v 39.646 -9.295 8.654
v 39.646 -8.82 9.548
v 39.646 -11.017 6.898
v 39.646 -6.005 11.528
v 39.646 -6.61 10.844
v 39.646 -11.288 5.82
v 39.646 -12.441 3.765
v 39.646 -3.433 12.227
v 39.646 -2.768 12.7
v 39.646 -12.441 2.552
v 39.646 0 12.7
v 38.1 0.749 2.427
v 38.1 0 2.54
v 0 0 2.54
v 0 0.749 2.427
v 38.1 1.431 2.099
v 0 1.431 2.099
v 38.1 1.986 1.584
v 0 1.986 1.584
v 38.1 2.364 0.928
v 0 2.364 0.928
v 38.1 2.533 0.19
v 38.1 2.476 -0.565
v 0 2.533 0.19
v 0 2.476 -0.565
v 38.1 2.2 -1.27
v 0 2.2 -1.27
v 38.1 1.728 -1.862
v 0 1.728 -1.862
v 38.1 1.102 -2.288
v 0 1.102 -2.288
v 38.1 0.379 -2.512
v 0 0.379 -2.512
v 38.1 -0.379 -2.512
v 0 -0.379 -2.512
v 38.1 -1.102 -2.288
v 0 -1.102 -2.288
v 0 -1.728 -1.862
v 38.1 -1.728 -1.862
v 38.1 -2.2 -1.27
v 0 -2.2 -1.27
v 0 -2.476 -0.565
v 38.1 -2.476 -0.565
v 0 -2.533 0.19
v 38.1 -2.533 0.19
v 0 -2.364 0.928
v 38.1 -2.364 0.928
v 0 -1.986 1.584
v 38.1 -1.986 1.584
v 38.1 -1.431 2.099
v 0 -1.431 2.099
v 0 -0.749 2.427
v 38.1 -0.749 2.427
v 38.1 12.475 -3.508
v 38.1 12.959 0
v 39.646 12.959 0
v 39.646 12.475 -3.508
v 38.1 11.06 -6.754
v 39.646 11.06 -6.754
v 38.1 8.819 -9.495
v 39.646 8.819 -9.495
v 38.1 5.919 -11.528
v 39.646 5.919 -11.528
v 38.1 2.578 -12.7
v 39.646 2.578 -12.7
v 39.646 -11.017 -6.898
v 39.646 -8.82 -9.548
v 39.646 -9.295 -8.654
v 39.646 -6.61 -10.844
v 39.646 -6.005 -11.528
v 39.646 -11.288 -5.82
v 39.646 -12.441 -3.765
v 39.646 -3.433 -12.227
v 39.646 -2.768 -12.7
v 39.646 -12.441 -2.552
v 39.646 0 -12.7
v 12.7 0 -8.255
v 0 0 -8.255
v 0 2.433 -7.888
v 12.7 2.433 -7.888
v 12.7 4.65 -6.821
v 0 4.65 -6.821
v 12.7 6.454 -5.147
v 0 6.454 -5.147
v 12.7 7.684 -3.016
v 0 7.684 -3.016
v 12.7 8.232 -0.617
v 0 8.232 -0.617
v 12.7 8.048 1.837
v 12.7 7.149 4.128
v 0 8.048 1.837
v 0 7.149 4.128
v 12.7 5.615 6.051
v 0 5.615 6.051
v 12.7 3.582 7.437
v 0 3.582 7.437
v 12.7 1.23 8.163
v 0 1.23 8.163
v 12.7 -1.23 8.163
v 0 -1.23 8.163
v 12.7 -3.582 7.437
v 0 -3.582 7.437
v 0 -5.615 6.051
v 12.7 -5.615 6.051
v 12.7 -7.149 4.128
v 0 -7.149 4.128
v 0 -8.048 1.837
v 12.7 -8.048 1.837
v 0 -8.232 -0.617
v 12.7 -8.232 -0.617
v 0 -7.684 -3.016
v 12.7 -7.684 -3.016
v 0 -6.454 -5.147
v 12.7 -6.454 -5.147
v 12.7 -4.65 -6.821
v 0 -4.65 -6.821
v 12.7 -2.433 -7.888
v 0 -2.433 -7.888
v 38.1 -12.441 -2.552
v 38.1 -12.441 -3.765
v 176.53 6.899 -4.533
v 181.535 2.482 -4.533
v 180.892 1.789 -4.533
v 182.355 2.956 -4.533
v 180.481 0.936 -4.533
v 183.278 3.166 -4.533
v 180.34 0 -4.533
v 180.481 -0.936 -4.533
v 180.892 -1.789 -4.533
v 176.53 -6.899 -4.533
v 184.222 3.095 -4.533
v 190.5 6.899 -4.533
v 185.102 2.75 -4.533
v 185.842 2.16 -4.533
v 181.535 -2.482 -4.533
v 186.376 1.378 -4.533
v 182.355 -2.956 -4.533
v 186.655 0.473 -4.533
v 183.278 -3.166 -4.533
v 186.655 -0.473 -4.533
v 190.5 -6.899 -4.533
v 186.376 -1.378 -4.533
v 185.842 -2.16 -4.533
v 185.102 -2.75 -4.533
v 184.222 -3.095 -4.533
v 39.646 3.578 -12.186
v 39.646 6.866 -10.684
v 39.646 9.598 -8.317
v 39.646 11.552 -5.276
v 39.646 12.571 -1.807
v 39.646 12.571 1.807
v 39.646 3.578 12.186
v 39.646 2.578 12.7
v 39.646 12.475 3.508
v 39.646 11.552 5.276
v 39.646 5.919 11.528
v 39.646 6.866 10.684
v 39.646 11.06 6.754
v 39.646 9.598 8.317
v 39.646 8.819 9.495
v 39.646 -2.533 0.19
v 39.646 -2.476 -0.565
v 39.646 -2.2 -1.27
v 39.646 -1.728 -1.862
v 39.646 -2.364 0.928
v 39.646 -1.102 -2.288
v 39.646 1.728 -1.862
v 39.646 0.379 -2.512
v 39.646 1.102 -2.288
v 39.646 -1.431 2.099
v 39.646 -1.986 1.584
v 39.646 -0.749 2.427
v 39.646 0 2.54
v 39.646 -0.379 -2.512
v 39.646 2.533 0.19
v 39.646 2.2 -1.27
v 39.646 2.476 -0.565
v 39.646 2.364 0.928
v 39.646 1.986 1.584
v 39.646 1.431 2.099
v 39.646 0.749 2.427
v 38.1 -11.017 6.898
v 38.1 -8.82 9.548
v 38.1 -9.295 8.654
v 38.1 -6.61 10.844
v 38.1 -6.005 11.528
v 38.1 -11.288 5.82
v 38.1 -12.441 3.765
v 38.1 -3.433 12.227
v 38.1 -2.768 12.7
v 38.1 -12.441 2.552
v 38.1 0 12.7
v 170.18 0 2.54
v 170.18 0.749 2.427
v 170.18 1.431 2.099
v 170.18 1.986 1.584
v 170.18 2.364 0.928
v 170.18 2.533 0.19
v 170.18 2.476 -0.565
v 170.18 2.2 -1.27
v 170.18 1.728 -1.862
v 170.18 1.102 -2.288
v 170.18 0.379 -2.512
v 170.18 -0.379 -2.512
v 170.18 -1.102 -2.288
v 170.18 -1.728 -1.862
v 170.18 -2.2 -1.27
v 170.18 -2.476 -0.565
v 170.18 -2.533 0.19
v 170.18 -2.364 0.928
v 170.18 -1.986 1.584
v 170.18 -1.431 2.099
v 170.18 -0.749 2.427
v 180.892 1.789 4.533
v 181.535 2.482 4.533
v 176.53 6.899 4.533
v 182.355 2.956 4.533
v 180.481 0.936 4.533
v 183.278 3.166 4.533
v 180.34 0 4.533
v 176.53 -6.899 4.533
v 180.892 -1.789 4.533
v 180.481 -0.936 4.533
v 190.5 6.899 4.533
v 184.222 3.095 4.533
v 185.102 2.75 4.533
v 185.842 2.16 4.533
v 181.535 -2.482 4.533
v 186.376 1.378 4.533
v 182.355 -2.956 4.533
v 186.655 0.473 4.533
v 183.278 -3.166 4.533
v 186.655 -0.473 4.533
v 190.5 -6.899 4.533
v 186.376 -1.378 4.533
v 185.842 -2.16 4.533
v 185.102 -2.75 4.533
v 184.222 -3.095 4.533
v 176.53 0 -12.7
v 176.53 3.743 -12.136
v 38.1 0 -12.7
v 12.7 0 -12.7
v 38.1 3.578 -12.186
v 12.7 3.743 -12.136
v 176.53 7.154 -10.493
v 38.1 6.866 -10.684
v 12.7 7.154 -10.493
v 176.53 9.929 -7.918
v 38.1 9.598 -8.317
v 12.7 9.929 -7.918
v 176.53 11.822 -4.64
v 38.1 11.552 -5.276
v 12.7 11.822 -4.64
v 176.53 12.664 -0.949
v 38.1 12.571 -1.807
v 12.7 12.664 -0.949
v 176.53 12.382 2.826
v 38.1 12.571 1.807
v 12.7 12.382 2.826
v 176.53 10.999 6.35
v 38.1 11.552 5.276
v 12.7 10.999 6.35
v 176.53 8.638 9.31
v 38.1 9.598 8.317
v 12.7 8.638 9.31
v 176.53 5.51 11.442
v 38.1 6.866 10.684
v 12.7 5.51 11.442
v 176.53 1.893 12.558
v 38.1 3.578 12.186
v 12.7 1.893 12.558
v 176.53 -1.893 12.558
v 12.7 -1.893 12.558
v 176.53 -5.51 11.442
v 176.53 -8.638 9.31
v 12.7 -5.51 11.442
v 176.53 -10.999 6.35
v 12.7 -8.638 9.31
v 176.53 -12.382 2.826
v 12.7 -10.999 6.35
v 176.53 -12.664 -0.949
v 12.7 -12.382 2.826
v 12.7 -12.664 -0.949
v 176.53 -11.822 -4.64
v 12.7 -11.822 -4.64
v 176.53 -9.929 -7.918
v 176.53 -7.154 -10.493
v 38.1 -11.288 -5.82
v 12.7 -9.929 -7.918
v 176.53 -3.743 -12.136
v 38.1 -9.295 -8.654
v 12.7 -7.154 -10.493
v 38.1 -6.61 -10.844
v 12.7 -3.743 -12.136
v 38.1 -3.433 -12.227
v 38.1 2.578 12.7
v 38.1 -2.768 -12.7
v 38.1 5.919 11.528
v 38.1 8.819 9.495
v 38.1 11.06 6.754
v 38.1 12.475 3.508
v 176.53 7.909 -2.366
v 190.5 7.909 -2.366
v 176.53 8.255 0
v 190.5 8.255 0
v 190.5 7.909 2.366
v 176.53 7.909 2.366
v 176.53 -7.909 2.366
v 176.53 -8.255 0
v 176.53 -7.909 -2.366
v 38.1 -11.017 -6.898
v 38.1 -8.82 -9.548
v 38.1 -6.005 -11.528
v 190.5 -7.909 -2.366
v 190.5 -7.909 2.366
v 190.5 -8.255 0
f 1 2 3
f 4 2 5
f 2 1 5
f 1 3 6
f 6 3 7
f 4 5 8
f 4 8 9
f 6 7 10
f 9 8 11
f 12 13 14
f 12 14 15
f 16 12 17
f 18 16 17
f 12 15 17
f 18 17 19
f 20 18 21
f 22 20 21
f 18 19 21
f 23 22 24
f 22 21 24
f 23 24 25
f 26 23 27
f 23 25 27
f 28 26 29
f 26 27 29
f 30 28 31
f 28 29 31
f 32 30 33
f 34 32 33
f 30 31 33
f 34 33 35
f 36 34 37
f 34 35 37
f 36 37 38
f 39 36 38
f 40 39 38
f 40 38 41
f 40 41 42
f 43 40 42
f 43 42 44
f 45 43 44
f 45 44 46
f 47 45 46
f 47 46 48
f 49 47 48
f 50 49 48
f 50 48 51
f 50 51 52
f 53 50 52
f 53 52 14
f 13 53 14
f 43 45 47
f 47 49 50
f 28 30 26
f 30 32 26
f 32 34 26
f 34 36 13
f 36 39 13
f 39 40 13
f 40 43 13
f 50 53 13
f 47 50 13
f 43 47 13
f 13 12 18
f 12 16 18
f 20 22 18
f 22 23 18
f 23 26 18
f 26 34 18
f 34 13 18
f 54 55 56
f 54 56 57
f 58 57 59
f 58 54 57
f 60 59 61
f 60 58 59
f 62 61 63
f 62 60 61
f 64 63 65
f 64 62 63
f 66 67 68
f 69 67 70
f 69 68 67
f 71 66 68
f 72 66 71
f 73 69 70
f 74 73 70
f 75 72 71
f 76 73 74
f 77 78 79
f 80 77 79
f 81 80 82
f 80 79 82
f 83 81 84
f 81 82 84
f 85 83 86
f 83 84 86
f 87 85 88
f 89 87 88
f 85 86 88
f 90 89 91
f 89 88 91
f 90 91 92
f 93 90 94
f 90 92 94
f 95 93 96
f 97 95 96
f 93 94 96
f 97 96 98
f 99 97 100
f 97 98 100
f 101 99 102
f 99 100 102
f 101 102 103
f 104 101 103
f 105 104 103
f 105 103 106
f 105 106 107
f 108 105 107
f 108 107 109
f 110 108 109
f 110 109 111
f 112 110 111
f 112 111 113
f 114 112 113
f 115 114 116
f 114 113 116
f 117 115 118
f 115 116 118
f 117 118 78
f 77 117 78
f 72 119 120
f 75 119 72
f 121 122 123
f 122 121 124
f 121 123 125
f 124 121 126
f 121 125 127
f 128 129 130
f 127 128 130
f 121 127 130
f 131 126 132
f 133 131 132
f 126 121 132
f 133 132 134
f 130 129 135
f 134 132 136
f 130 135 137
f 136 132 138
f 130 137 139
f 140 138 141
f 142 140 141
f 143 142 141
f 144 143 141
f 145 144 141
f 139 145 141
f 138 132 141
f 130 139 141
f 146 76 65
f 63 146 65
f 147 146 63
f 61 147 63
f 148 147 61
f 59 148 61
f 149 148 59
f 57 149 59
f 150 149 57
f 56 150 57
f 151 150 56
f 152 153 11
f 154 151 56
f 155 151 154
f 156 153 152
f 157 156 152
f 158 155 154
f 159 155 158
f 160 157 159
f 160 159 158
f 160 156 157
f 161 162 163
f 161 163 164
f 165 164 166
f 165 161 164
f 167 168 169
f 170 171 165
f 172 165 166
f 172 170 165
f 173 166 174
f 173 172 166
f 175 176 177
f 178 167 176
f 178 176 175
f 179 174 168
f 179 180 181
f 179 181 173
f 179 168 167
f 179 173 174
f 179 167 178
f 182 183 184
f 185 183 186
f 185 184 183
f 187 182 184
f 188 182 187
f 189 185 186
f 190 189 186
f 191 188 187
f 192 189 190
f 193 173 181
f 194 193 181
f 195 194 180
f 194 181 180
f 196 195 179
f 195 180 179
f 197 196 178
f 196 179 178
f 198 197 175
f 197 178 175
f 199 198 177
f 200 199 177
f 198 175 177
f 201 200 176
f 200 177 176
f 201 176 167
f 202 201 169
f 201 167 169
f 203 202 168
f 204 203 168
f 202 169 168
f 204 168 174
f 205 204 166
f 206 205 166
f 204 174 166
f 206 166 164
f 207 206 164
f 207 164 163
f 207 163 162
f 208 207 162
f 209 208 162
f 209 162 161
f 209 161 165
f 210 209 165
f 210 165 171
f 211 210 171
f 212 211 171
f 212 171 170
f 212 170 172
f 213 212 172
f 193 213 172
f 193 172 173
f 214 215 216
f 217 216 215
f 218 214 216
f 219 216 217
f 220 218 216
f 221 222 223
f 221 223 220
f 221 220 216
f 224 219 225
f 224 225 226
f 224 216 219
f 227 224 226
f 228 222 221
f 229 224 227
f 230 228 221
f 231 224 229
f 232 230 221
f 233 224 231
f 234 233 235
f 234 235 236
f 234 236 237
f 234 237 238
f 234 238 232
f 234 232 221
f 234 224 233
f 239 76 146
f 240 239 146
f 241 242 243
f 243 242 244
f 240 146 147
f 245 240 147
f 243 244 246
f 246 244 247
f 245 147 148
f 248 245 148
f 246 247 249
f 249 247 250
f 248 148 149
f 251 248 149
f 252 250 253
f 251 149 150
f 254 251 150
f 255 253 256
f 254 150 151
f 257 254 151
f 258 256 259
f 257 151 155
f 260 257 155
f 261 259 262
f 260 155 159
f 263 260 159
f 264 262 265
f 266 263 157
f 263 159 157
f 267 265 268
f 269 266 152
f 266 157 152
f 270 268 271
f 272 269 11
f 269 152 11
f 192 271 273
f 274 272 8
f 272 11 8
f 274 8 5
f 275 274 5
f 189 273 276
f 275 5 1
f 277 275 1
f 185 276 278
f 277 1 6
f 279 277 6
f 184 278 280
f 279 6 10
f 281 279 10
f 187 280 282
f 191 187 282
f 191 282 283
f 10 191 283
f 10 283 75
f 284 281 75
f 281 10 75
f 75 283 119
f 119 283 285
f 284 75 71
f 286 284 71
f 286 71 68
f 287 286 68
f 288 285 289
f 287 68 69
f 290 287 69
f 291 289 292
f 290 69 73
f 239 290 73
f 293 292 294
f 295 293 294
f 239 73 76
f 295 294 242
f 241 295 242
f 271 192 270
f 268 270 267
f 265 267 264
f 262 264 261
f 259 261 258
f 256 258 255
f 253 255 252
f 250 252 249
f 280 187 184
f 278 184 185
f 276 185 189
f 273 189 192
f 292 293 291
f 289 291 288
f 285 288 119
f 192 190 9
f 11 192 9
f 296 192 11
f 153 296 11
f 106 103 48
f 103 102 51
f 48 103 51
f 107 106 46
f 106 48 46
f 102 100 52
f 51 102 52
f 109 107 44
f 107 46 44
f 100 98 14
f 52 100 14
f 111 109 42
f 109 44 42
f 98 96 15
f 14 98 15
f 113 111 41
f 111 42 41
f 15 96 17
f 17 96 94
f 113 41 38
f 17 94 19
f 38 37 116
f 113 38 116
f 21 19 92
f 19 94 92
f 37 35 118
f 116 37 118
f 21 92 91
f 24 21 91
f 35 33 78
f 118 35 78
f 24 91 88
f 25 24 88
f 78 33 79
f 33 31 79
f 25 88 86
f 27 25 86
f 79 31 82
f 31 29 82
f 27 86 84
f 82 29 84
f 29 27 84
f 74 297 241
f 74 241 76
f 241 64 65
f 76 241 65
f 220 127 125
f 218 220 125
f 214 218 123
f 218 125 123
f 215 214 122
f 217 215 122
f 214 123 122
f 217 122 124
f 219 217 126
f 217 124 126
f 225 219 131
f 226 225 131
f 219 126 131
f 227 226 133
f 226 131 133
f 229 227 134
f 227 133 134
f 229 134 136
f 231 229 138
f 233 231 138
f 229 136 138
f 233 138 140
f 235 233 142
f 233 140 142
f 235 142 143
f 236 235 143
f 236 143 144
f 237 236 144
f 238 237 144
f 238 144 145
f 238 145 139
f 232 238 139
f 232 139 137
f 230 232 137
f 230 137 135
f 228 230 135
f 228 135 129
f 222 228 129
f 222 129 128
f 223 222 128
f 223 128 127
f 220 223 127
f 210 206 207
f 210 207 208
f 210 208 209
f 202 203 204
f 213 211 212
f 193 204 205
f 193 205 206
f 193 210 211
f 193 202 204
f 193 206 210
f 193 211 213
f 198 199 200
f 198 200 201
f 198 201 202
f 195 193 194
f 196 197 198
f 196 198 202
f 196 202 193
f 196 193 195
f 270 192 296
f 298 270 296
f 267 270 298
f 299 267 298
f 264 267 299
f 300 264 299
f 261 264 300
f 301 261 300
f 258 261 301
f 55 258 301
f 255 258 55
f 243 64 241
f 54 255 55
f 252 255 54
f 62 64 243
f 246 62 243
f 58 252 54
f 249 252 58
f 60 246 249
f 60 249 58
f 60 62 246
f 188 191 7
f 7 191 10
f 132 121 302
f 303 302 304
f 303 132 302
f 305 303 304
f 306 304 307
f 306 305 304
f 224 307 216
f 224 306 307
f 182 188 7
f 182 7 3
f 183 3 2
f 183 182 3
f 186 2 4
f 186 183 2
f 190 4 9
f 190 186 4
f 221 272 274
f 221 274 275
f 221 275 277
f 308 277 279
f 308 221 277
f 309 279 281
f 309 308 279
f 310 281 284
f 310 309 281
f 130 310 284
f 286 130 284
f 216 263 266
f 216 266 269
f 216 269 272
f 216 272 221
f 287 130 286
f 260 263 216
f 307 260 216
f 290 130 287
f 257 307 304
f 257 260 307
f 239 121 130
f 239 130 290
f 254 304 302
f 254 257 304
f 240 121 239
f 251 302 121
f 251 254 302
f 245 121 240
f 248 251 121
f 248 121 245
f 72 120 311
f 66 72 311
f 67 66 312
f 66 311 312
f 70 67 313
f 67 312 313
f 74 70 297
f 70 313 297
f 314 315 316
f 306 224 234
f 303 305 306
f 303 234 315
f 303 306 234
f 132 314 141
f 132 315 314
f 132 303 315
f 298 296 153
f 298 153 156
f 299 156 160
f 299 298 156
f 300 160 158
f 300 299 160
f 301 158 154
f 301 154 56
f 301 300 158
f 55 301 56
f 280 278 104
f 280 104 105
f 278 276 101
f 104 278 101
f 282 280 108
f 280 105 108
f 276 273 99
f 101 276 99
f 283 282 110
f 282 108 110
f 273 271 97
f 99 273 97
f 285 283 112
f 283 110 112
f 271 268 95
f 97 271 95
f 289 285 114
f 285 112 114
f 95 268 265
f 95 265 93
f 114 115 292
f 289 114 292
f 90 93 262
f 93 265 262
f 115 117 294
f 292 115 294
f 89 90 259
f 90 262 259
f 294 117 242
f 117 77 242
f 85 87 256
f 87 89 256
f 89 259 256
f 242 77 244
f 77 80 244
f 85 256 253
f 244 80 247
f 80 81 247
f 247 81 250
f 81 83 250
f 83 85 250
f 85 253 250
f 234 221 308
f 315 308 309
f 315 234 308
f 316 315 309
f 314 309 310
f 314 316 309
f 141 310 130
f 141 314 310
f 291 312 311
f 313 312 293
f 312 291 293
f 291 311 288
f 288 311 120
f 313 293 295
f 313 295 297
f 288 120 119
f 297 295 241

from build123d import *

# Parameters (mm, degrees)
CROQUIS2_R                   = 12.7
SALIENTE_EXTRUIR1_DEPTH      = 190.5
CROQUIS3_R                   = 12.7
CROQUIS3_R_2                 = 8.255
CORTAR_EXTRUIR1_DEPTH        = 12.7
CROQUIS4_R                   = 2.54
CORTAR_EXTRUIR2_DEPTH        = 170.18
CROQUIS6_R                   = 12.7
CROQUIS6_R_2                 = 8.255
CORTAR_EXTRUIR6_DEPTH        = 16.51
CORTAR_EXTRUIR8_DEPTH        = 16.51
CROQUIS9_R                   = 3.175
CORTAR_EXTRUIR9_DEPTH        = 16.51
CROQUIS10_W                  = 1.546124295
CROQUIS10_H                  = 25.4
SALIENTE_EXTRUIR2_DEPTH      = 12.7
SALIENTE_EXTRUIR2_DEPTH_BACK = 12.7
CORTAR_EXTRUIR10_DEPTH       = 64.262
CORTAR_EXTRUIR11_DEPTH       = 64.262
CORTAR_EXTRUIR12_DEPTH       = 64.262


with BuildPart() as part:
    # Croquis2 → Saliente-Extruir1 (new body)
    with BuildSketch(Plane(origin=(0, 0, 0), x_dir=(0, 0, -1), z_dir=(1, 0, 0))):
        Circle(CROQUIS2_R)
    extrude(amount=SALIENTE_EXTRUIR1_DEPTH)

    # Croquis3 → Cortar-Extruir1 (cut)
    with BuildSketch(Plane(origin=(0, 0, 0), x_dir=(0, 0, -1), z_dir=(1, 0, 0))):
        Circle(CROQUIS3_R)
        Circle(CROQUIS3_R_2, mode=Mode.SUBTRACT)
    extrude(amount=CORTAR_EXTRUIR1_DEPTH, mode=Mode.SUBTRACT)

    # Croquis4 → Cortar-Extruir2 (cut)
    with BuildSketch(Plane.ZY):
        Circle(CROQUIS4_R)
    extrude(amount=-CORTAR_EXTRUIR2_DEPTH, mode=Mode.SUBTRACT)

    # Croquis6 → Cortar-Extruir6 (cut)
    with BuildSketch(Plane(origin=(193.04, 0, 0), x_dir=(0, 0, -1), z_dir=(1, 0, 0))):
        Circle(CROQUIS6_R)
        Circle(CROQUIS6_R_2, mode=Mode.SUBTRACT)
    extrude(amount=-CORTAR_EXTRUIR6_DEPTH, mode=Mode.SUBTRACT)

    # Croquis8 → Cortar-Extruir8 (cut)
    with BuildSketch(Plane(origin=(193.04, 0, 0), x_dir=(0, 0, -1), z_dir=(1, 0, 0))):
        with BuildLine():
            Line((-4.533022208, 6.899038677), (-4.533022208, -6.899038677))
            ThreePointArc((-4.533022208, -6.899038677), (-8.255, 0), (-4.533022208, 6.899038677))
        make_face()
        with BuildLine():
            Line((4.533022208, 6.899038677), (4.533022208, -6.899038677))
            ThreePointArc((4.533022208, -6.899038677), (8.255, 0), (4.533022208, 6.899038677))
        make_face()
    extrude(amount=-CORTAR_EXTRUIR8_DEPTH, mode=Mode.SUBTRACT)

    # Croquis9 → Cortar-Extruir9 (cut)
    with BuildSketch(Plane(origin=(0, 0, -4.533022208), x_dir=(-1, 0, 0), z_dir=(0, 0, -1))):
        with Locations((-183.515, 0)):
            Circle(CROQUIS9_R)
    extrude(amount=-CORTAR_EXTRUIR9_DEPTH, mode=Mode.SUBTRACT)

    # Croquis10 → Saliente-Extruir2 (add, two sides)
    with BuildSketch(Plane.XY) as saliente_extruir2_sk:
        with Locations((38.873062148, 0.259017105)):
            Rectangle(CROQUIS10_W, CROQUIS10_H)
    extrude(amount=SALIENTE_EXTRUIR2_DEPTH)
    extrude(saliente_extruir2_sk.sketch, amount=-SALIENTE_EXTRUIR2_DEPTH_BACK)

    # Croquis12 → Cortar-Extruir10 (cut)
    with BuildSketch(Plane(origin=(0, 0, 0), x_dir=(0, 0, -1), z_dir=(1, 0, 0))):
        with BuildLine():
            Line((0, 12.959017105), (-12.7, 12.959017105))
            Line((-12.7, 12.959017105), (-12.7, 2.578007822))
            ThreePointArc((-12.7, 2.578007822), (-8.201453434, 10.033557988), (0, 12.959017105))
        make_face()
    extrude(amount=CORTAR_EXTRUIR10_DEPTH, mode=Mode.SUBTRACT)

    # Croquis13 → Cortar-Extruir11 (cut)
    with BuildSketch(Plane.ZY.offset(-38.1)):
        with BuildLine():
            Line((-12.7, 2.578007822), (-12.7, 12.959017105))
            Line((-12.7, 12.959017105), (0, 12.959017105))
            ThreePointArc((0, 12.959017105), (-8.201453434, 10.033557988), (-12.7, 2.578007822))
        make_face()
    extrude(amount=-CORTAR_EXTRUIR11_DEPTH, mode=Mode.SUBTRACT)

    # Croquis14 → Cortar-Extruir12 (cut)
    with BuildSketch(Plane.ZY.offset(-38.1)):
        with BuildLine():
            Line((12.7, -2.768457402), (12.7, -12.440982895))
            Line((12.7, -12.440982895), (3.765142892, -12.440982895))
            ThreePointArc((3.765142892, -12.440982895), (9.548019164, -8.819846168), (12.7, -2.768457402))
        make_face()
        with BuildLine():
            Line((-12.769462216, -2.428001465), (-12.7, -12.440982895))
            Line((-12.7, -12.440982895), (-3.765142892, -12.440982895))
            ThreePointArc((-3.765142892, -12.440982895), (-9.66505255, -8.691439213), (-12.769462216, -2.428001465))
        make_face()
    extrude(amount=-CORTAR_EXTRUIR12_DEPTH, mode=Mode.SUBTRACT)


solid = part.part
